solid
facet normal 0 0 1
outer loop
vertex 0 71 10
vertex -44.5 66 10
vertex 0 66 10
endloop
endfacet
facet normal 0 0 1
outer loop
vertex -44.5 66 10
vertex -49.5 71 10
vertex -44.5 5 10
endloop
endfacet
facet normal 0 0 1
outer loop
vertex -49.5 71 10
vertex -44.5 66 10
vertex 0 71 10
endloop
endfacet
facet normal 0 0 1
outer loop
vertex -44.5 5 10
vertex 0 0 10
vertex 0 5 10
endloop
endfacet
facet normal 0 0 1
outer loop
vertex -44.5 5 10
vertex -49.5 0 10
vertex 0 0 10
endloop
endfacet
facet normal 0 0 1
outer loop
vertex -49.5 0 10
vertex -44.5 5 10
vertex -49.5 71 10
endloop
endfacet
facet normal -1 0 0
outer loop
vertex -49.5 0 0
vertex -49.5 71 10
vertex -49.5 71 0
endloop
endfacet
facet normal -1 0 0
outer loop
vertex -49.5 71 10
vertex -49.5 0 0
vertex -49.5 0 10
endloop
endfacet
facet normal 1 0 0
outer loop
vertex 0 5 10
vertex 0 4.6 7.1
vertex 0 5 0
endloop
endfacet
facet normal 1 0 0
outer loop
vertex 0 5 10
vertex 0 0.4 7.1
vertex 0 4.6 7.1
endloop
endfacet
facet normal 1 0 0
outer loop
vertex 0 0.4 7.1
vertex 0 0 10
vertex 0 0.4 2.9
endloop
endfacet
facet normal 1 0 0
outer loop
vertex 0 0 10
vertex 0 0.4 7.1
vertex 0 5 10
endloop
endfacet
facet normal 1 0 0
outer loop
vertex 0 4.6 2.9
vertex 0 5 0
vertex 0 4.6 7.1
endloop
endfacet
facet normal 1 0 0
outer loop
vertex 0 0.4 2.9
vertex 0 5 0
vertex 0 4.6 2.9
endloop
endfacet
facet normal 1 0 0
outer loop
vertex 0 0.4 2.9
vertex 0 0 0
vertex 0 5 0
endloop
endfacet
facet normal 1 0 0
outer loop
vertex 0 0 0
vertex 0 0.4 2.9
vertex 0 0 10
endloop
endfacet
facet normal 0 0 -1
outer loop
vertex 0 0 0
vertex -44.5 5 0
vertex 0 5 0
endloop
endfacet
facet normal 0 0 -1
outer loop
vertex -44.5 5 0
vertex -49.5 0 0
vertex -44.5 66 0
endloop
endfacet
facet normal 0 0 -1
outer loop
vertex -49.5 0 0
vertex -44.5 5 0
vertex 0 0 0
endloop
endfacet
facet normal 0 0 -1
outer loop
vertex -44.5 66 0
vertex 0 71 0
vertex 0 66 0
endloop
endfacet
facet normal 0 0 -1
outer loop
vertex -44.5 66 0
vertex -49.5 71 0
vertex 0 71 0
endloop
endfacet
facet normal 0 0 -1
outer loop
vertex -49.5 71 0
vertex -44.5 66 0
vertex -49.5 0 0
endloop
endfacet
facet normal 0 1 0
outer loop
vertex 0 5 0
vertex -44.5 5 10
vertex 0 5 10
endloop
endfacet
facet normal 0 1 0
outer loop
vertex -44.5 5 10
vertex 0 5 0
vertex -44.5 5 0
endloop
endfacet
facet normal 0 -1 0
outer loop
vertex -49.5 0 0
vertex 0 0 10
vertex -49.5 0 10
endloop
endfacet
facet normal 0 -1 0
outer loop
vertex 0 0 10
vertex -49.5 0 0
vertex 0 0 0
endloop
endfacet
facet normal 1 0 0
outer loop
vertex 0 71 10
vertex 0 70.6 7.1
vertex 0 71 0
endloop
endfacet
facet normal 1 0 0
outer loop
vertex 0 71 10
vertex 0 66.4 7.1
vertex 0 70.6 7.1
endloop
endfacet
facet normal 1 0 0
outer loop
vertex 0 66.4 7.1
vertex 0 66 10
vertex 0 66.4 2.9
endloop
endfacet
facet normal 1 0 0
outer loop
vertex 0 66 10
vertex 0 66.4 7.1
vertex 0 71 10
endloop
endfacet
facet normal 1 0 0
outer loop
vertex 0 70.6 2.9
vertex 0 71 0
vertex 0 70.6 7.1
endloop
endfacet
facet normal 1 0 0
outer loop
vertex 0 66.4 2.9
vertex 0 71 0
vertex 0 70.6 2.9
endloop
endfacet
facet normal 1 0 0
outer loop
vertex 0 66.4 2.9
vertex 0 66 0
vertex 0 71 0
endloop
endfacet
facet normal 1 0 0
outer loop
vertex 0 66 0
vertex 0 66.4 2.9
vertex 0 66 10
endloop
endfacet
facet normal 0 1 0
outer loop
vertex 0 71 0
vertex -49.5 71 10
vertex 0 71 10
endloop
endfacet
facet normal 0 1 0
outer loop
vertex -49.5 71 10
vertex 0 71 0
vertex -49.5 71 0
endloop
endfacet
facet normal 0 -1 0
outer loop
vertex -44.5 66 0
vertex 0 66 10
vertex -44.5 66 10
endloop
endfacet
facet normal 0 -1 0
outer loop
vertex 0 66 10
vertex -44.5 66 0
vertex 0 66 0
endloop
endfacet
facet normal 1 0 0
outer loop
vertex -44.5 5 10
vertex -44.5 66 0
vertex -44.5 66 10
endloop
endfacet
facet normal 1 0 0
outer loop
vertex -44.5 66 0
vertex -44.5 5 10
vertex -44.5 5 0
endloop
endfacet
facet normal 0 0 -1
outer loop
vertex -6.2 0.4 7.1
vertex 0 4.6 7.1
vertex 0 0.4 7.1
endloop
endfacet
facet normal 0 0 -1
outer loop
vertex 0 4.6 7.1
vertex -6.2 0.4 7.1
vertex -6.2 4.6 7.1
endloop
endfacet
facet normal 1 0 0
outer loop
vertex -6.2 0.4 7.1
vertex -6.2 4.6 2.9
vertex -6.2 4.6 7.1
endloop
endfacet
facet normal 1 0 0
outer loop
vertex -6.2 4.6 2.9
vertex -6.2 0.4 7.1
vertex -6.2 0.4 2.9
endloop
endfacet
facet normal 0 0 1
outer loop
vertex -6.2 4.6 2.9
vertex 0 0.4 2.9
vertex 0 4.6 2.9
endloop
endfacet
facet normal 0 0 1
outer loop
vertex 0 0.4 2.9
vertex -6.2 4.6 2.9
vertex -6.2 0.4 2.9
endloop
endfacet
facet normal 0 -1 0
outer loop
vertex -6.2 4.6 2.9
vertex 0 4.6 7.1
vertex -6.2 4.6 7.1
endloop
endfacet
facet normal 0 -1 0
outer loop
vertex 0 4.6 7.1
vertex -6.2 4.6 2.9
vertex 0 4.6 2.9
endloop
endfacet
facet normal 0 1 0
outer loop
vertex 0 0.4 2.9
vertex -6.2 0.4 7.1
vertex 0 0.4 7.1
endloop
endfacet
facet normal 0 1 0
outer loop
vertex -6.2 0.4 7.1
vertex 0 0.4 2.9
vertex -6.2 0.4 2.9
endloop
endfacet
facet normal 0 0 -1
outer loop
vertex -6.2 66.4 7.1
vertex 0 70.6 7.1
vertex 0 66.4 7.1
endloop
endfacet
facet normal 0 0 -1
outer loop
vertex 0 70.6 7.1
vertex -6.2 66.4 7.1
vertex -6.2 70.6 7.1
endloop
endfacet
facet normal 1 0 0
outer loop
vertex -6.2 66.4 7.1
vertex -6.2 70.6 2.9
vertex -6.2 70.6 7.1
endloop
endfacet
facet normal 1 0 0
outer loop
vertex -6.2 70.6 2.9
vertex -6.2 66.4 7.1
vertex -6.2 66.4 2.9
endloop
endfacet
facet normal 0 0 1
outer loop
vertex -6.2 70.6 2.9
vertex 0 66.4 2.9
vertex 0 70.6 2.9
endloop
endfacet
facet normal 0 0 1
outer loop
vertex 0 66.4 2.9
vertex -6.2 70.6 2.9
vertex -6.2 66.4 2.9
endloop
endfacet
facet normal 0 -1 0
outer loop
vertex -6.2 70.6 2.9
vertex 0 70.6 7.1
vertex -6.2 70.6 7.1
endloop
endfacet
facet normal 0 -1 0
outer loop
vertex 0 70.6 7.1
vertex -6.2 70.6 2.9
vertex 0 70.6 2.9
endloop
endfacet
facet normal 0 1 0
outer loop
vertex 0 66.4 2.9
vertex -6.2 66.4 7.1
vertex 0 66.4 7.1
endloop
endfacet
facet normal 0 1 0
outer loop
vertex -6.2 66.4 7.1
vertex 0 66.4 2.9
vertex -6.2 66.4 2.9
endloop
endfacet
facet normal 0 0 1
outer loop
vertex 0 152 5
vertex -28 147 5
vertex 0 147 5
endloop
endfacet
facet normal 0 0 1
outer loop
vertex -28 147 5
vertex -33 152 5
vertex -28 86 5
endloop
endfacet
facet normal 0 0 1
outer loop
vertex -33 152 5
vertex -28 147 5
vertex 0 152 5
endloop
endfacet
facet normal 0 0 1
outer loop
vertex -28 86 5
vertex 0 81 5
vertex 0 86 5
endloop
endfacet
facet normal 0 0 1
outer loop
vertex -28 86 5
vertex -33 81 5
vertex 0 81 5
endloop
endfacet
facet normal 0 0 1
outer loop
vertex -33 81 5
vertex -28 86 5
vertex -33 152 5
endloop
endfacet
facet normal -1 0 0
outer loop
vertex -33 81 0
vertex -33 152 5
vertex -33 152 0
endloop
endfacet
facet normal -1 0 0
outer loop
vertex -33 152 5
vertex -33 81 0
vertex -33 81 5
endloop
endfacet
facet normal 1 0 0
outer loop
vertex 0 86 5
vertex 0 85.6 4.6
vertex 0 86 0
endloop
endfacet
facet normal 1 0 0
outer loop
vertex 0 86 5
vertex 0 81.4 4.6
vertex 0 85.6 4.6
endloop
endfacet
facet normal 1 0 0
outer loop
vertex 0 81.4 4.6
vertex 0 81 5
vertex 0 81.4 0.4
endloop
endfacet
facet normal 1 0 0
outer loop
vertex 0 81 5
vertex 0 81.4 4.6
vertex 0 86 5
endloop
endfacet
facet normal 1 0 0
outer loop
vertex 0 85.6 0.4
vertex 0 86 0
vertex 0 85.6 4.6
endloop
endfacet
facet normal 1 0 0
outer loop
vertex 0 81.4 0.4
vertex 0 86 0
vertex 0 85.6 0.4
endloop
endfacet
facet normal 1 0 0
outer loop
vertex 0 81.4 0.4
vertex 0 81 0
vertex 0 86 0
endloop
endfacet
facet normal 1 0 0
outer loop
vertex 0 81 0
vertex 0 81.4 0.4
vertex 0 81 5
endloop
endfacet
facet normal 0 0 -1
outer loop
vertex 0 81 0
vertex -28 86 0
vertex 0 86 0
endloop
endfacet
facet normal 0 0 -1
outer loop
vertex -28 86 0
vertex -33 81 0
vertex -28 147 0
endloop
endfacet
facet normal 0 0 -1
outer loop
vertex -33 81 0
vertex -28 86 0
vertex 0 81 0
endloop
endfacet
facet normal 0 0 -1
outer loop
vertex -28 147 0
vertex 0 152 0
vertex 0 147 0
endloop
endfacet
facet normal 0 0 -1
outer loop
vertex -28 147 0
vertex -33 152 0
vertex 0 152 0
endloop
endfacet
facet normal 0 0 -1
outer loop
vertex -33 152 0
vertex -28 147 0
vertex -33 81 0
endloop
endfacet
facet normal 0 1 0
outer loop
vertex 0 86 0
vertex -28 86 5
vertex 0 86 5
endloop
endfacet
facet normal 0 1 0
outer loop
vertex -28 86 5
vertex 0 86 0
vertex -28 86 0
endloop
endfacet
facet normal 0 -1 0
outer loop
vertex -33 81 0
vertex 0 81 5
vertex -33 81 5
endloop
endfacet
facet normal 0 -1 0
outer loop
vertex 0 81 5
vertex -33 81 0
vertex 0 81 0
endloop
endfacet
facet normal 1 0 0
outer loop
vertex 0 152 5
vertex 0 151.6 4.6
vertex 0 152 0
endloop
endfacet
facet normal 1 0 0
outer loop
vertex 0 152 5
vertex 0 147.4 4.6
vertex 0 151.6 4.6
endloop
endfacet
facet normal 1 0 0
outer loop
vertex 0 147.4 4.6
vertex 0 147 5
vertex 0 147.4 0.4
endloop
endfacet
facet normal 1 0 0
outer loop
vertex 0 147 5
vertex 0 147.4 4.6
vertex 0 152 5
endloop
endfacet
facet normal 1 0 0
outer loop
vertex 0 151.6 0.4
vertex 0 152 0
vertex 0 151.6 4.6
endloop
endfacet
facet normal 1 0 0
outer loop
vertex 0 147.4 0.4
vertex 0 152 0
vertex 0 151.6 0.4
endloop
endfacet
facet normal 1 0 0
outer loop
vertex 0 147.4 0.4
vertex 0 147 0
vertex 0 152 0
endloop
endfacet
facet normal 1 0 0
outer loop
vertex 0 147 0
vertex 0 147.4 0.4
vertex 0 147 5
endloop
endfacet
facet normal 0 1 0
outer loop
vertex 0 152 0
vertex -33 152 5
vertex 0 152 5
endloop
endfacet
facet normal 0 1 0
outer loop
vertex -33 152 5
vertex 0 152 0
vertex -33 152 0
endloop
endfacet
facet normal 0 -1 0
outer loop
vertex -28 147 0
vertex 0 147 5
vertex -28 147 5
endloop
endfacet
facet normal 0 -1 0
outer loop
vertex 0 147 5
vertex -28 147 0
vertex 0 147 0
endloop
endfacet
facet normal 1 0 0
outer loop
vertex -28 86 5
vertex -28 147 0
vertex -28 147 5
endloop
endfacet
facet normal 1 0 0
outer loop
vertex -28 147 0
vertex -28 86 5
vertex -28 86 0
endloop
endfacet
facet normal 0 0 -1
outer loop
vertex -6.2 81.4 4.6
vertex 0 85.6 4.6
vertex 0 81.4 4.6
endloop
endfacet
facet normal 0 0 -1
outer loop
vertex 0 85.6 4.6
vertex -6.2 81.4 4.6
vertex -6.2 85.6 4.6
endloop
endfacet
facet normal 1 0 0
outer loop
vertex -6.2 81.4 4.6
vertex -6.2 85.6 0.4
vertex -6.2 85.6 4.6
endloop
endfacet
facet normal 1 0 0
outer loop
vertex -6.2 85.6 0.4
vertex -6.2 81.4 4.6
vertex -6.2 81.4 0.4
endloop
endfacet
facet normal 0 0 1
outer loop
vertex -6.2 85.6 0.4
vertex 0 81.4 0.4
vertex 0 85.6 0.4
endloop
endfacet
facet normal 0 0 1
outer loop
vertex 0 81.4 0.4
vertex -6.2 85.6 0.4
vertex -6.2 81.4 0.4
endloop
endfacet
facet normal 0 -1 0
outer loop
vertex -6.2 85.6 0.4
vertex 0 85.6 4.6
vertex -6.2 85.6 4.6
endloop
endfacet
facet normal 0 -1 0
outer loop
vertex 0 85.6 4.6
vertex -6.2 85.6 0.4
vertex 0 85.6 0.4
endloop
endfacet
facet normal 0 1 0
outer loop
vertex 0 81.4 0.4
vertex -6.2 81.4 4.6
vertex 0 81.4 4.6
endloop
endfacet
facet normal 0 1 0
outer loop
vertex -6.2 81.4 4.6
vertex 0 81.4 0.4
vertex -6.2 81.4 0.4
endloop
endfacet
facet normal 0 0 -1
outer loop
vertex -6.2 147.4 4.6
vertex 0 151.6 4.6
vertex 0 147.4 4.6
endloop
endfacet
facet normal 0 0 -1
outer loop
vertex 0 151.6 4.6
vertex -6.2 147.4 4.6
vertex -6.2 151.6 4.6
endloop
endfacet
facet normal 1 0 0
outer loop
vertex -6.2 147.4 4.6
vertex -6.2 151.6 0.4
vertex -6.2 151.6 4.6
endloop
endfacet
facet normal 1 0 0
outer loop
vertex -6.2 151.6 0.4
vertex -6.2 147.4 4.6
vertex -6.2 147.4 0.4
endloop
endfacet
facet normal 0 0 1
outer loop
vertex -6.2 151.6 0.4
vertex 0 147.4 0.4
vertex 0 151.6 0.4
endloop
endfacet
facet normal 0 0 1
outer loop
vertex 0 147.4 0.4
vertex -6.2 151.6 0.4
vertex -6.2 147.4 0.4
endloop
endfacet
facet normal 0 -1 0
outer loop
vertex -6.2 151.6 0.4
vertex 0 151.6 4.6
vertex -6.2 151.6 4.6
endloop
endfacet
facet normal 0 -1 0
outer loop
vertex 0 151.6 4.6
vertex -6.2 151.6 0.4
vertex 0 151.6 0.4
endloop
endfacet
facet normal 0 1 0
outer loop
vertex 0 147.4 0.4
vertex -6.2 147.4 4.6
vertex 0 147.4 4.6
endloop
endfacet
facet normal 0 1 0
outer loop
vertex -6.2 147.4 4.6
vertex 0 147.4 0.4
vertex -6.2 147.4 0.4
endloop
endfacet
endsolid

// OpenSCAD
// Neato XV Signature Pro - Outer Left Pod SIDES
// Two side walls — outer (left/exposed) taller, inner (right/vent) shorter.
// No center support posts — open for wire routing and port access.
// Sockets in base of each corner post accept bosses from outer_left_pod_base.scad.
//
// PRINT ORIENTATION: lay each wall flat on its outer face.
// Posts print horizontally — stronger layer lines, faster print.
// No supports needed.

// ============================================================
// PARAMETERS (must match outer_left_pod_base.scad)
// ============================================================

pod_width  = 77;
pod_depth  = 71;

rail_w       = 5;
outer_rail_w = 10;

outer_wall_h = 66 * 0.75;  // ~50mm — protection on exposed edge
inner_wall_h = 66 * 0.50;  // ~33mm — wire routing access

// Socket dimensions — fit over 4x4mm bosses with 0.2mm clearance
socket_size  = 4.2;
socket_depth = 6.2;

// ============================================================
// MODULES
// ============================================================

module socket() {
    translate([-socket_size/2, -socket_size/2, 0])
        cube([socket_size, socket_size, socket_depth]);
}

module outer_side() {
    difference() {
        union() {
            // Back post
            cube([outer_rail_w, rail_w, outer_wall_h]);
            // Front post
            translate([0, pod_depth - rail_w, 0])
                cube([outer_rail_w, rail_w, outer_wall_h]);
            // Top horizontal
            translate([0, 0, outer_wall_h - rail_w])
                cube([outer_rail_w, pod_depth, rail_w]);
        }
        // Sockets in base of posts
        translate([outer_rail_w/2, rail_w/2, 0])           socket();  // back
        translate([outer_rail_w/2, pod_depth - rail_w/2, 0]) socket();  // front
    }
}

module inner_side() {
    difference() {
        union() {
            // Back post
            cube([rail_w, rail_w, inner_wall_h]);
            // Front post
            translate([0, pod_depth - rail_w, 0])
                cube([rail_w, rail_w, inner_wall_h]);
            // Top horizontal
            translate([0, 0, inner_wall_h - rail_w])
                cube([rail_w, pod_depth, rail_w]);
        }
        // Sockets in base of posts
        translate([rail_w/2, rail_w/2, 0])           socket();  // back
        translate([rail_w/2, pod_depth - rail_w/2, 0]) socket();  // front
    }
}

// ============================================================
// MAIN
// Each side rotated so it lies flat on the print bed.
// ============================================================

// Outer side — rotate flat
rotate([0, -90, 0])
outer_side();

// Inner side — rotate flat, offset in Y
translate([0, pod_depth + 10, 0])
rotate([0, -90, 0])
inner_side();
